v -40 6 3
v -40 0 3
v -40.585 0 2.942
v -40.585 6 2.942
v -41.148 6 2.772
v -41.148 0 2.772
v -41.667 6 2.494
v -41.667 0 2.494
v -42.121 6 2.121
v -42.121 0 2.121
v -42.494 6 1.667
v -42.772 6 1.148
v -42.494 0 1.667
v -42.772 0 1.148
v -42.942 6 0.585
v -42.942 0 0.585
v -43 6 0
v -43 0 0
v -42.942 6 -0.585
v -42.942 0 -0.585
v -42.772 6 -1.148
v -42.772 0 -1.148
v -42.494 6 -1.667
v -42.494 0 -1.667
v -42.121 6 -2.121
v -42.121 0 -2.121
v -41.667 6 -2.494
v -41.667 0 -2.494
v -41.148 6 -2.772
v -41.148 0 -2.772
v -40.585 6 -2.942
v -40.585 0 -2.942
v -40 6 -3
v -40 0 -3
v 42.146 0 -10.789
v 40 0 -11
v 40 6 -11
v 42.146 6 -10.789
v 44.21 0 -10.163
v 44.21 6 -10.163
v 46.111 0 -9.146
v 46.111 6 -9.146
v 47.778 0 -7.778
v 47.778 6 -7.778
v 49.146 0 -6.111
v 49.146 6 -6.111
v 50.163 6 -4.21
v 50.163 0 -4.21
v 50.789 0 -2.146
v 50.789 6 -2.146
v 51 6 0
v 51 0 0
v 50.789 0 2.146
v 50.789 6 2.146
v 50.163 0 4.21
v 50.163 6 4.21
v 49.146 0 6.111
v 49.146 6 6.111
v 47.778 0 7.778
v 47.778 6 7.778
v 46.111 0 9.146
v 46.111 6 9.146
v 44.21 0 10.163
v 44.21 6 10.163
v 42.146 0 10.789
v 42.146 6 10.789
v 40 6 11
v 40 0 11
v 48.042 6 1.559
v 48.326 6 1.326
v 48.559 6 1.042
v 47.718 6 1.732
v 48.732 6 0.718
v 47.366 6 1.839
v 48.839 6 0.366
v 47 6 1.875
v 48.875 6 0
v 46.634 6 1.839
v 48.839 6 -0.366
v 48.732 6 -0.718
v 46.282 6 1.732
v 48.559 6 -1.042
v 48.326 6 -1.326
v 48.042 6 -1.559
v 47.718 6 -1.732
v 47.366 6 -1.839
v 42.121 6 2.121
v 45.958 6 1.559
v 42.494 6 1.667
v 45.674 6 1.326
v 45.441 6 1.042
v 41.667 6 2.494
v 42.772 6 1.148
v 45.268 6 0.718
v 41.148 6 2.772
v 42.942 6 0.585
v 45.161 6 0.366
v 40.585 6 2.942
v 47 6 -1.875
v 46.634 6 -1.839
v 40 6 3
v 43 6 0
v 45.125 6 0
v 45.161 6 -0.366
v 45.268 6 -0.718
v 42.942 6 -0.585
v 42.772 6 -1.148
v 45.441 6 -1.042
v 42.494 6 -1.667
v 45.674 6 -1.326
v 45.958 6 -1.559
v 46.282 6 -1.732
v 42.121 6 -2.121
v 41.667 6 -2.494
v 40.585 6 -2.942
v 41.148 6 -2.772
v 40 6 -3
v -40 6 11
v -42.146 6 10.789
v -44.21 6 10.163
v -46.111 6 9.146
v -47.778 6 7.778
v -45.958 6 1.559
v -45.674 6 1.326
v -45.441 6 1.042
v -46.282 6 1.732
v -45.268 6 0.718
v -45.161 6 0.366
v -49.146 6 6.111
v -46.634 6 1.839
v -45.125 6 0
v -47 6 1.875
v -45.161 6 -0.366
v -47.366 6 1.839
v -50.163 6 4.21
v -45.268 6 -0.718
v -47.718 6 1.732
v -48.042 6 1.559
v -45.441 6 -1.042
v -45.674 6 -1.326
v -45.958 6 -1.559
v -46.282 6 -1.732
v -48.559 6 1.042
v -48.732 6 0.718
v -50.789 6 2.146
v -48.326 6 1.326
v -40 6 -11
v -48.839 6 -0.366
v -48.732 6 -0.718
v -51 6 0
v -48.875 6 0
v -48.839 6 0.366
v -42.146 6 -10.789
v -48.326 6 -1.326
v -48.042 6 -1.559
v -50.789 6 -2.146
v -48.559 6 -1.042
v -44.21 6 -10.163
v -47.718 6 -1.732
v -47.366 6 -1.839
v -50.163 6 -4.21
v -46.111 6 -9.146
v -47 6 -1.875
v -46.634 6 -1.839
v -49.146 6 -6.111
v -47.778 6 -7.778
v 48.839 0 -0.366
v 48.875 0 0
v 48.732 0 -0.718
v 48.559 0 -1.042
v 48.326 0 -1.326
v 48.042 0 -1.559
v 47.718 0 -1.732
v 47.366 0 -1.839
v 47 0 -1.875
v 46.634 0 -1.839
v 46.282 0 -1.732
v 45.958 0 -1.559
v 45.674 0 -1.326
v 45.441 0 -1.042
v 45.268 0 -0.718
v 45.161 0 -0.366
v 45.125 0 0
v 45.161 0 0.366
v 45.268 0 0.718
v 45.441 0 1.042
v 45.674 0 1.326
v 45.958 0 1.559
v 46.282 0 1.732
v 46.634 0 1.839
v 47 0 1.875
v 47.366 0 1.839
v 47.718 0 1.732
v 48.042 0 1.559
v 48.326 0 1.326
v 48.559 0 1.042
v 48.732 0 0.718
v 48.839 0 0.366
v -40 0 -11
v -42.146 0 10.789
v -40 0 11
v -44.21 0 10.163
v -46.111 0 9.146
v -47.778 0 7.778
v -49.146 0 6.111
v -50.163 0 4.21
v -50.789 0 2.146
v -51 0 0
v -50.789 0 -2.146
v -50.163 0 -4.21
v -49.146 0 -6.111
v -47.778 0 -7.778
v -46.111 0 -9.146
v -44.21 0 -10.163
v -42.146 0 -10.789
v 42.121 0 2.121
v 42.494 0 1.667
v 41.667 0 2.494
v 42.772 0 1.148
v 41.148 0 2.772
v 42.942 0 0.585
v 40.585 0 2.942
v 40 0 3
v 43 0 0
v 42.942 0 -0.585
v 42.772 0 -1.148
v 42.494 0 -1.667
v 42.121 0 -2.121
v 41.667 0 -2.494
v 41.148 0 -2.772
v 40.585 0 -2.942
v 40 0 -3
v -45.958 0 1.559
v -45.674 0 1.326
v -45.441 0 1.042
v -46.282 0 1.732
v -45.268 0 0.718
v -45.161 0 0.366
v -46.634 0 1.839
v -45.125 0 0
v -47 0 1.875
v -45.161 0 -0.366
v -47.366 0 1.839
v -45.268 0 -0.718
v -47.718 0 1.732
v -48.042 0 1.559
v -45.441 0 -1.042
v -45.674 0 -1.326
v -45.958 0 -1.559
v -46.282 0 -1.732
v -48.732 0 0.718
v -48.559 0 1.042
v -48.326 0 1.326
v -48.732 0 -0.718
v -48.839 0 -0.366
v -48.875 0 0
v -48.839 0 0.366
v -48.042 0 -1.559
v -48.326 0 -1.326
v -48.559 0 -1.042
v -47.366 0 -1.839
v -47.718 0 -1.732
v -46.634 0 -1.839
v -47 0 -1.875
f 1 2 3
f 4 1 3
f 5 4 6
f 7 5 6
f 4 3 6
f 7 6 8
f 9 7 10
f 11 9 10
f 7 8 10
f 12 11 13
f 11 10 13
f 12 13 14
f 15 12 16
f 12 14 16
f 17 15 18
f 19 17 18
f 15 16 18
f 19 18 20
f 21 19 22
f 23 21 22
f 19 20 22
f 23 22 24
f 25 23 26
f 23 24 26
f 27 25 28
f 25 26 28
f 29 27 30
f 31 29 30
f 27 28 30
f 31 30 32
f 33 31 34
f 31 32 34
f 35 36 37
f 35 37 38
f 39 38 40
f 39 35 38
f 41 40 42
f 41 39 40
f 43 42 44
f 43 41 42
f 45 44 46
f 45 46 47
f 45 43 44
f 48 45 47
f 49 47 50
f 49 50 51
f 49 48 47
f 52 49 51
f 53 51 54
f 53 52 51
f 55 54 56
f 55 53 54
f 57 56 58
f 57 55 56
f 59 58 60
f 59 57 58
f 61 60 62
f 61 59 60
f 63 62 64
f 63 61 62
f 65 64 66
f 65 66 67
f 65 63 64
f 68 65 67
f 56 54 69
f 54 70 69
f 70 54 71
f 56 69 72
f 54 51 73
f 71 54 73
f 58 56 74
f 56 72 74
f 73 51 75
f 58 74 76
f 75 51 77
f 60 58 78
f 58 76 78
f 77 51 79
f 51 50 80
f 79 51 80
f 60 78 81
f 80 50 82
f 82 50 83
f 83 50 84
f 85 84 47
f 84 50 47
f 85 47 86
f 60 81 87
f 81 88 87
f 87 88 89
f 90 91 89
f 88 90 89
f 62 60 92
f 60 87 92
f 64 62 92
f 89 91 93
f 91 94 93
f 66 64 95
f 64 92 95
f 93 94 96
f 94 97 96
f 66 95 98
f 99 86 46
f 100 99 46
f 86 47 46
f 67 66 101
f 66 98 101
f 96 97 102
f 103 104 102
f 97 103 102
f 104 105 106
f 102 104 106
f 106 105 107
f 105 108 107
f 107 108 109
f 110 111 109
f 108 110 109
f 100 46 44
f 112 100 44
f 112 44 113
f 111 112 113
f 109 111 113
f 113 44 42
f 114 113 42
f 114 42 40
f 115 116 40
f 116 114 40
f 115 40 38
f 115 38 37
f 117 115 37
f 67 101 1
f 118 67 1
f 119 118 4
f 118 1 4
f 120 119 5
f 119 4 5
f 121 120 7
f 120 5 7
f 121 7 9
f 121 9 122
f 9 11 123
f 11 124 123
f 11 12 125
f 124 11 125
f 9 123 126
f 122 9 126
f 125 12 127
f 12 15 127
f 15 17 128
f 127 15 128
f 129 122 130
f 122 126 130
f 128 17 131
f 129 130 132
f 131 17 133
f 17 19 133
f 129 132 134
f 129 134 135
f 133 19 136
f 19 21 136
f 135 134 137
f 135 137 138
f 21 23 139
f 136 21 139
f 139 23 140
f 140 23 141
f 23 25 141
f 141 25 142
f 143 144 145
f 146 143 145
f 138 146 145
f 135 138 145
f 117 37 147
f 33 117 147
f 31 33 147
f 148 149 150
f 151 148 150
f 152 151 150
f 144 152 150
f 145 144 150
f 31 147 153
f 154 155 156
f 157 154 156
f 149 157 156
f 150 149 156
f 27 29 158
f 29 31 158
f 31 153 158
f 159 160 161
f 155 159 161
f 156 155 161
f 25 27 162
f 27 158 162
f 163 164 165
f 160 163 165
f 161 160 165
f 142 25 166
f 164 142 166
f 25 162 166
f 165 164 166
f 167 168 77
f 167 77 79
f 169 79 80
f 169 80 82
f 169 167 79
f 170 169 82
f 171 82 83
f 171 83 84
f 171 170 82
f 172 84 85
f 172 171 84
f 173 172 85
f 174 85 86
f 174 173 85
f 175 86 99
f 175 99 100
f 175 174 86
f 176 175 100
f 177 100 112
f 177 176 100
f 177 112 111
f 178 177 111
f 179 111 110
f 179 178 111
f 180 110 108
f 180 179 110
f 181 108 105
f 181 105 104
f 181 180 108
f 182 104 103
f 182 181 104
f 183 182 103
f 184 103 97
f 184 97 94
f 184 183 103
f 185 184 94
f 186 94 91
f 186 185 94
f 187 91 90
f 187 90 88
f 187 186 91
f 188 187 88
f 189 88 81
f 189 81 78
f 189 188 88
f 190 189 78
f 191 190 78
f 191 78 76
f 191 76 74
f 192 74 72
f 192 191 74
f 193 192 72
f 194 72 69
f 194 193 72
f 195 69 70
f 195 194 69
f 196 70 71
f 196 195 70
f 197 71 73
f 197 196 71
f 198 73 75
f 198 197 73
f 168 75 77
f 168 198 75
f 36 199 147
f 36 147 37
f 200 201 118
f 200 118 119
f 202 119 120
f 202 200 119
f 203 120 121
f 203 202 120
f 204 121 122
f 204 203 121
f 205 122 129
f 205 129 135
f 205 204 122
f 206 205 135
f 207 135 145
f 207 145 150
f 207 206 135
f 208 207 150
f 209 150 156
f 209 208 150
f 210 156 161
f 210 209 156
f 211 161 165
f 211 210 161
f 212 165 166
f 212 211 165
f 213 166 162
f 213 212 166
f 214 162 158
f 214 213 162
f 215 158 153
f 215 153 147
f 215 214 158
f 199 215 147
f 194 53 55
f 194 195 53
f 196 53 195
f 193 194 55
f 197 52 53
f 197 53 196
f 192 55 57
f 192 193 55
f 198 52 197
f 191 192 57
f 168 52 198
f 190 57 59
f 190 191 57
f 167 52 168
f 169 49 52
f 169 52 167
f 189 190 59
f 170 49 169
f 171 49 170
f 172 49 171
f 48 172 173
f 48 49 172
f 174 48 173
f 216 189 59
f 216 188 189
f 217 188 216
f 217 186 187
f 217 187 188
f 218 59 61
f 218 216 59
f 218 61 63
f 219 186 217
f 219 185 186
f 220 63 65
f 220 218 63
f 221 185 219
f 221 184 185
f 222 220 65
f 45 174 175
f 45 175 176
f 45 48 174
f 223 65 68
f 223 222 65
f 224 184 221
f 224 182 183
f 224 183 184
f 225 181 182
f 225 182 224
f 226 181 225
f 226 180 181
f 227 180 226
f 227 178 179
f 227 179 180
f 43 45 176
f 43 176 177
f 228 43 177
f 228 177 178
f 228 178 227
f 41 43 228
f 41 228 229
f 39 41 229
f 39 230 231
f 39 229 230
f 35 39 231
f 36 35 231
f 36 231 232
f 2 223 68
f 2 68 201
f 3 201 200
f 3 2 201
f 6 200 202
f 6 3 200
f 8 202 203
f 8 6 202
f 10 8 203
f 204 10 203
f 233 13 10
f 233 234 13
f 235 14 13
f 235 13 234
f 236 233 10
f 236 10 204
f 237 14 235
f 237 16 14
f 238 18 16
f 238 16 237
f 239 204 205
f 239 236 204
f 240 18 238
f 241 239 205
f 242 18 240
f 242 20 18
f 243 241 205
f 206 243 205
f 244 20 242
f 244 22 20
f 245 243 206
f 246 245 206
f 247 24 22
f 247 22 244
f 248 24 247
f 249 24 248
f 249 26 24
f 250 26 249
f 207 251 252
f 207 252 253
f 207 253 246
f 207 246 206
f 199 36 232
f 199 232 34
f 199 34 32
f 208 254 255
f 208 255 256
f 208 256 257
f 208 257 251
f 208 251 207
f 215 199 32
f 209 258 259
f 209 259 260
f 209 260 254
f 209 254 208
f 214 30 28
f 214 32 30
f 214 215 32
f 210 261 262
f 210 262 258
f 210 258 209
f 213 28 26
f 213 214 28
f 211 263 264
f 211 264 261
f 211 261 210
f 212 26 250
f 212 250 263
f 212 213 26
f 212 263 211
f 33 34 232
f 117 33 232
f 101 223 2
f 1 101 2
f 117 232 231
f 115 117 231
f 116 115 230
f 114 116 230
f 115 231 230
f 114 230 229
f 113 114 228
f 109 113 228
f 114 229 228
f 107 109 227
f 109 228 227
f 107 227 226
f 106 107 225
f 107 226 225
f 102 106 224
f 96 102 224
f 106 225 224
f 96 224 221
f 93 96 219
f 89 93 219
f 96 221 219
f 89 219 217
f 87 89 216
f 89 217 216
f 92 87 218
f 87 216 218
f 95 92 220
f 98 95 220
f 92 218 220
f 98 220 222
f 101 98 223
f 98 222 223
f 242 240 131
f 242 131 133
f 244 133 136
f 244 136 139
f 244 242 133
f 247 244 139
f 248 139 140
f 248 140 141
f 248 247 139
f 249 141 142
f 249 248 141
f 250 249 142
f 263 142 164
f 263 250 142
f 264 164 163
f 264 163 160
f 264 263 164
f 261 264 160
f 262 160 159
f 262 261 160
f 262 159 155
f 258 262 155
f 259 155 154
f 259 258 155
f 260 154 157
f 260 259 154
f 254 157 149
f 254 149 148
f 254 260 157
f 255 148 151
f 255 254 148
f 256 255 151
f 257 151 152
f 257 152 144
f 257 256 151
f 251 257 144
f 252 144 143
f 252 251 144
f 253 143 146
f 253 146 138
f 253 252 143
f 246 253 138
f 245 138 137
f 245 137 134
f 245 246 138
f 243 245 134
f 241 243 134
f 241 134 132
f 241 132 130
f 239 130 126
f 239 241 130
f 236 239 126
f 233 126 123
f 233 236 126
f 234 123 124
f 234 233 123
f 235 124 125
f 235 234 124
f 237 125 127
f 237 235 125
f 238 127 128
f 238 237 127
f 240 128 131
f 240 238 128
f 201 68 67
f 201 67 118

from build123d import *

# Parameters (mm, degrees)
CROQUIS1_R              = 1.875
SALIENTE_EXTRUIR1_DEPTH = 6


with BuildPart() as part:
    # Croquis1 → Saliente-Extruir1 (new body)
    with BuildSketch(Plane(origin=(0, 0, 0), x_dir=(1, 0, 0), z_dir=(0, 1, 0))):
        with BuildLine():
            Line((-40, 11), (40, 11))
            ThreePointArc((40, 11), (51, 0), (40, -11))
            Line((40, -11), (-40, -11))
            ThreePointArc((-40, -11), (-51, 0), (-40, 11))
        make_face()
        with Locations((-47, 0)):
            Circle(CROQUIS1_R, mode=Mode.SUBTRACT)
        with Locations((47, 0)):
            Circle(CROQUIS1_R, mode=Mode.SUBTRACT)
        with BuildLine():
            Line((-40, 3), (40, 3))
            ThreePointArc((40, 3), (43, 0), (40, -3))
            Line((40, -3), (-40, -3))
            ThreePointArc((-40, -3), (-43, 0), (-40, 3))
        make_face(mode=Mode.SUBTRACT)
    extrude(amount=SALIENTE_EXTRUIR1_DEPTH)


solid = part.part
